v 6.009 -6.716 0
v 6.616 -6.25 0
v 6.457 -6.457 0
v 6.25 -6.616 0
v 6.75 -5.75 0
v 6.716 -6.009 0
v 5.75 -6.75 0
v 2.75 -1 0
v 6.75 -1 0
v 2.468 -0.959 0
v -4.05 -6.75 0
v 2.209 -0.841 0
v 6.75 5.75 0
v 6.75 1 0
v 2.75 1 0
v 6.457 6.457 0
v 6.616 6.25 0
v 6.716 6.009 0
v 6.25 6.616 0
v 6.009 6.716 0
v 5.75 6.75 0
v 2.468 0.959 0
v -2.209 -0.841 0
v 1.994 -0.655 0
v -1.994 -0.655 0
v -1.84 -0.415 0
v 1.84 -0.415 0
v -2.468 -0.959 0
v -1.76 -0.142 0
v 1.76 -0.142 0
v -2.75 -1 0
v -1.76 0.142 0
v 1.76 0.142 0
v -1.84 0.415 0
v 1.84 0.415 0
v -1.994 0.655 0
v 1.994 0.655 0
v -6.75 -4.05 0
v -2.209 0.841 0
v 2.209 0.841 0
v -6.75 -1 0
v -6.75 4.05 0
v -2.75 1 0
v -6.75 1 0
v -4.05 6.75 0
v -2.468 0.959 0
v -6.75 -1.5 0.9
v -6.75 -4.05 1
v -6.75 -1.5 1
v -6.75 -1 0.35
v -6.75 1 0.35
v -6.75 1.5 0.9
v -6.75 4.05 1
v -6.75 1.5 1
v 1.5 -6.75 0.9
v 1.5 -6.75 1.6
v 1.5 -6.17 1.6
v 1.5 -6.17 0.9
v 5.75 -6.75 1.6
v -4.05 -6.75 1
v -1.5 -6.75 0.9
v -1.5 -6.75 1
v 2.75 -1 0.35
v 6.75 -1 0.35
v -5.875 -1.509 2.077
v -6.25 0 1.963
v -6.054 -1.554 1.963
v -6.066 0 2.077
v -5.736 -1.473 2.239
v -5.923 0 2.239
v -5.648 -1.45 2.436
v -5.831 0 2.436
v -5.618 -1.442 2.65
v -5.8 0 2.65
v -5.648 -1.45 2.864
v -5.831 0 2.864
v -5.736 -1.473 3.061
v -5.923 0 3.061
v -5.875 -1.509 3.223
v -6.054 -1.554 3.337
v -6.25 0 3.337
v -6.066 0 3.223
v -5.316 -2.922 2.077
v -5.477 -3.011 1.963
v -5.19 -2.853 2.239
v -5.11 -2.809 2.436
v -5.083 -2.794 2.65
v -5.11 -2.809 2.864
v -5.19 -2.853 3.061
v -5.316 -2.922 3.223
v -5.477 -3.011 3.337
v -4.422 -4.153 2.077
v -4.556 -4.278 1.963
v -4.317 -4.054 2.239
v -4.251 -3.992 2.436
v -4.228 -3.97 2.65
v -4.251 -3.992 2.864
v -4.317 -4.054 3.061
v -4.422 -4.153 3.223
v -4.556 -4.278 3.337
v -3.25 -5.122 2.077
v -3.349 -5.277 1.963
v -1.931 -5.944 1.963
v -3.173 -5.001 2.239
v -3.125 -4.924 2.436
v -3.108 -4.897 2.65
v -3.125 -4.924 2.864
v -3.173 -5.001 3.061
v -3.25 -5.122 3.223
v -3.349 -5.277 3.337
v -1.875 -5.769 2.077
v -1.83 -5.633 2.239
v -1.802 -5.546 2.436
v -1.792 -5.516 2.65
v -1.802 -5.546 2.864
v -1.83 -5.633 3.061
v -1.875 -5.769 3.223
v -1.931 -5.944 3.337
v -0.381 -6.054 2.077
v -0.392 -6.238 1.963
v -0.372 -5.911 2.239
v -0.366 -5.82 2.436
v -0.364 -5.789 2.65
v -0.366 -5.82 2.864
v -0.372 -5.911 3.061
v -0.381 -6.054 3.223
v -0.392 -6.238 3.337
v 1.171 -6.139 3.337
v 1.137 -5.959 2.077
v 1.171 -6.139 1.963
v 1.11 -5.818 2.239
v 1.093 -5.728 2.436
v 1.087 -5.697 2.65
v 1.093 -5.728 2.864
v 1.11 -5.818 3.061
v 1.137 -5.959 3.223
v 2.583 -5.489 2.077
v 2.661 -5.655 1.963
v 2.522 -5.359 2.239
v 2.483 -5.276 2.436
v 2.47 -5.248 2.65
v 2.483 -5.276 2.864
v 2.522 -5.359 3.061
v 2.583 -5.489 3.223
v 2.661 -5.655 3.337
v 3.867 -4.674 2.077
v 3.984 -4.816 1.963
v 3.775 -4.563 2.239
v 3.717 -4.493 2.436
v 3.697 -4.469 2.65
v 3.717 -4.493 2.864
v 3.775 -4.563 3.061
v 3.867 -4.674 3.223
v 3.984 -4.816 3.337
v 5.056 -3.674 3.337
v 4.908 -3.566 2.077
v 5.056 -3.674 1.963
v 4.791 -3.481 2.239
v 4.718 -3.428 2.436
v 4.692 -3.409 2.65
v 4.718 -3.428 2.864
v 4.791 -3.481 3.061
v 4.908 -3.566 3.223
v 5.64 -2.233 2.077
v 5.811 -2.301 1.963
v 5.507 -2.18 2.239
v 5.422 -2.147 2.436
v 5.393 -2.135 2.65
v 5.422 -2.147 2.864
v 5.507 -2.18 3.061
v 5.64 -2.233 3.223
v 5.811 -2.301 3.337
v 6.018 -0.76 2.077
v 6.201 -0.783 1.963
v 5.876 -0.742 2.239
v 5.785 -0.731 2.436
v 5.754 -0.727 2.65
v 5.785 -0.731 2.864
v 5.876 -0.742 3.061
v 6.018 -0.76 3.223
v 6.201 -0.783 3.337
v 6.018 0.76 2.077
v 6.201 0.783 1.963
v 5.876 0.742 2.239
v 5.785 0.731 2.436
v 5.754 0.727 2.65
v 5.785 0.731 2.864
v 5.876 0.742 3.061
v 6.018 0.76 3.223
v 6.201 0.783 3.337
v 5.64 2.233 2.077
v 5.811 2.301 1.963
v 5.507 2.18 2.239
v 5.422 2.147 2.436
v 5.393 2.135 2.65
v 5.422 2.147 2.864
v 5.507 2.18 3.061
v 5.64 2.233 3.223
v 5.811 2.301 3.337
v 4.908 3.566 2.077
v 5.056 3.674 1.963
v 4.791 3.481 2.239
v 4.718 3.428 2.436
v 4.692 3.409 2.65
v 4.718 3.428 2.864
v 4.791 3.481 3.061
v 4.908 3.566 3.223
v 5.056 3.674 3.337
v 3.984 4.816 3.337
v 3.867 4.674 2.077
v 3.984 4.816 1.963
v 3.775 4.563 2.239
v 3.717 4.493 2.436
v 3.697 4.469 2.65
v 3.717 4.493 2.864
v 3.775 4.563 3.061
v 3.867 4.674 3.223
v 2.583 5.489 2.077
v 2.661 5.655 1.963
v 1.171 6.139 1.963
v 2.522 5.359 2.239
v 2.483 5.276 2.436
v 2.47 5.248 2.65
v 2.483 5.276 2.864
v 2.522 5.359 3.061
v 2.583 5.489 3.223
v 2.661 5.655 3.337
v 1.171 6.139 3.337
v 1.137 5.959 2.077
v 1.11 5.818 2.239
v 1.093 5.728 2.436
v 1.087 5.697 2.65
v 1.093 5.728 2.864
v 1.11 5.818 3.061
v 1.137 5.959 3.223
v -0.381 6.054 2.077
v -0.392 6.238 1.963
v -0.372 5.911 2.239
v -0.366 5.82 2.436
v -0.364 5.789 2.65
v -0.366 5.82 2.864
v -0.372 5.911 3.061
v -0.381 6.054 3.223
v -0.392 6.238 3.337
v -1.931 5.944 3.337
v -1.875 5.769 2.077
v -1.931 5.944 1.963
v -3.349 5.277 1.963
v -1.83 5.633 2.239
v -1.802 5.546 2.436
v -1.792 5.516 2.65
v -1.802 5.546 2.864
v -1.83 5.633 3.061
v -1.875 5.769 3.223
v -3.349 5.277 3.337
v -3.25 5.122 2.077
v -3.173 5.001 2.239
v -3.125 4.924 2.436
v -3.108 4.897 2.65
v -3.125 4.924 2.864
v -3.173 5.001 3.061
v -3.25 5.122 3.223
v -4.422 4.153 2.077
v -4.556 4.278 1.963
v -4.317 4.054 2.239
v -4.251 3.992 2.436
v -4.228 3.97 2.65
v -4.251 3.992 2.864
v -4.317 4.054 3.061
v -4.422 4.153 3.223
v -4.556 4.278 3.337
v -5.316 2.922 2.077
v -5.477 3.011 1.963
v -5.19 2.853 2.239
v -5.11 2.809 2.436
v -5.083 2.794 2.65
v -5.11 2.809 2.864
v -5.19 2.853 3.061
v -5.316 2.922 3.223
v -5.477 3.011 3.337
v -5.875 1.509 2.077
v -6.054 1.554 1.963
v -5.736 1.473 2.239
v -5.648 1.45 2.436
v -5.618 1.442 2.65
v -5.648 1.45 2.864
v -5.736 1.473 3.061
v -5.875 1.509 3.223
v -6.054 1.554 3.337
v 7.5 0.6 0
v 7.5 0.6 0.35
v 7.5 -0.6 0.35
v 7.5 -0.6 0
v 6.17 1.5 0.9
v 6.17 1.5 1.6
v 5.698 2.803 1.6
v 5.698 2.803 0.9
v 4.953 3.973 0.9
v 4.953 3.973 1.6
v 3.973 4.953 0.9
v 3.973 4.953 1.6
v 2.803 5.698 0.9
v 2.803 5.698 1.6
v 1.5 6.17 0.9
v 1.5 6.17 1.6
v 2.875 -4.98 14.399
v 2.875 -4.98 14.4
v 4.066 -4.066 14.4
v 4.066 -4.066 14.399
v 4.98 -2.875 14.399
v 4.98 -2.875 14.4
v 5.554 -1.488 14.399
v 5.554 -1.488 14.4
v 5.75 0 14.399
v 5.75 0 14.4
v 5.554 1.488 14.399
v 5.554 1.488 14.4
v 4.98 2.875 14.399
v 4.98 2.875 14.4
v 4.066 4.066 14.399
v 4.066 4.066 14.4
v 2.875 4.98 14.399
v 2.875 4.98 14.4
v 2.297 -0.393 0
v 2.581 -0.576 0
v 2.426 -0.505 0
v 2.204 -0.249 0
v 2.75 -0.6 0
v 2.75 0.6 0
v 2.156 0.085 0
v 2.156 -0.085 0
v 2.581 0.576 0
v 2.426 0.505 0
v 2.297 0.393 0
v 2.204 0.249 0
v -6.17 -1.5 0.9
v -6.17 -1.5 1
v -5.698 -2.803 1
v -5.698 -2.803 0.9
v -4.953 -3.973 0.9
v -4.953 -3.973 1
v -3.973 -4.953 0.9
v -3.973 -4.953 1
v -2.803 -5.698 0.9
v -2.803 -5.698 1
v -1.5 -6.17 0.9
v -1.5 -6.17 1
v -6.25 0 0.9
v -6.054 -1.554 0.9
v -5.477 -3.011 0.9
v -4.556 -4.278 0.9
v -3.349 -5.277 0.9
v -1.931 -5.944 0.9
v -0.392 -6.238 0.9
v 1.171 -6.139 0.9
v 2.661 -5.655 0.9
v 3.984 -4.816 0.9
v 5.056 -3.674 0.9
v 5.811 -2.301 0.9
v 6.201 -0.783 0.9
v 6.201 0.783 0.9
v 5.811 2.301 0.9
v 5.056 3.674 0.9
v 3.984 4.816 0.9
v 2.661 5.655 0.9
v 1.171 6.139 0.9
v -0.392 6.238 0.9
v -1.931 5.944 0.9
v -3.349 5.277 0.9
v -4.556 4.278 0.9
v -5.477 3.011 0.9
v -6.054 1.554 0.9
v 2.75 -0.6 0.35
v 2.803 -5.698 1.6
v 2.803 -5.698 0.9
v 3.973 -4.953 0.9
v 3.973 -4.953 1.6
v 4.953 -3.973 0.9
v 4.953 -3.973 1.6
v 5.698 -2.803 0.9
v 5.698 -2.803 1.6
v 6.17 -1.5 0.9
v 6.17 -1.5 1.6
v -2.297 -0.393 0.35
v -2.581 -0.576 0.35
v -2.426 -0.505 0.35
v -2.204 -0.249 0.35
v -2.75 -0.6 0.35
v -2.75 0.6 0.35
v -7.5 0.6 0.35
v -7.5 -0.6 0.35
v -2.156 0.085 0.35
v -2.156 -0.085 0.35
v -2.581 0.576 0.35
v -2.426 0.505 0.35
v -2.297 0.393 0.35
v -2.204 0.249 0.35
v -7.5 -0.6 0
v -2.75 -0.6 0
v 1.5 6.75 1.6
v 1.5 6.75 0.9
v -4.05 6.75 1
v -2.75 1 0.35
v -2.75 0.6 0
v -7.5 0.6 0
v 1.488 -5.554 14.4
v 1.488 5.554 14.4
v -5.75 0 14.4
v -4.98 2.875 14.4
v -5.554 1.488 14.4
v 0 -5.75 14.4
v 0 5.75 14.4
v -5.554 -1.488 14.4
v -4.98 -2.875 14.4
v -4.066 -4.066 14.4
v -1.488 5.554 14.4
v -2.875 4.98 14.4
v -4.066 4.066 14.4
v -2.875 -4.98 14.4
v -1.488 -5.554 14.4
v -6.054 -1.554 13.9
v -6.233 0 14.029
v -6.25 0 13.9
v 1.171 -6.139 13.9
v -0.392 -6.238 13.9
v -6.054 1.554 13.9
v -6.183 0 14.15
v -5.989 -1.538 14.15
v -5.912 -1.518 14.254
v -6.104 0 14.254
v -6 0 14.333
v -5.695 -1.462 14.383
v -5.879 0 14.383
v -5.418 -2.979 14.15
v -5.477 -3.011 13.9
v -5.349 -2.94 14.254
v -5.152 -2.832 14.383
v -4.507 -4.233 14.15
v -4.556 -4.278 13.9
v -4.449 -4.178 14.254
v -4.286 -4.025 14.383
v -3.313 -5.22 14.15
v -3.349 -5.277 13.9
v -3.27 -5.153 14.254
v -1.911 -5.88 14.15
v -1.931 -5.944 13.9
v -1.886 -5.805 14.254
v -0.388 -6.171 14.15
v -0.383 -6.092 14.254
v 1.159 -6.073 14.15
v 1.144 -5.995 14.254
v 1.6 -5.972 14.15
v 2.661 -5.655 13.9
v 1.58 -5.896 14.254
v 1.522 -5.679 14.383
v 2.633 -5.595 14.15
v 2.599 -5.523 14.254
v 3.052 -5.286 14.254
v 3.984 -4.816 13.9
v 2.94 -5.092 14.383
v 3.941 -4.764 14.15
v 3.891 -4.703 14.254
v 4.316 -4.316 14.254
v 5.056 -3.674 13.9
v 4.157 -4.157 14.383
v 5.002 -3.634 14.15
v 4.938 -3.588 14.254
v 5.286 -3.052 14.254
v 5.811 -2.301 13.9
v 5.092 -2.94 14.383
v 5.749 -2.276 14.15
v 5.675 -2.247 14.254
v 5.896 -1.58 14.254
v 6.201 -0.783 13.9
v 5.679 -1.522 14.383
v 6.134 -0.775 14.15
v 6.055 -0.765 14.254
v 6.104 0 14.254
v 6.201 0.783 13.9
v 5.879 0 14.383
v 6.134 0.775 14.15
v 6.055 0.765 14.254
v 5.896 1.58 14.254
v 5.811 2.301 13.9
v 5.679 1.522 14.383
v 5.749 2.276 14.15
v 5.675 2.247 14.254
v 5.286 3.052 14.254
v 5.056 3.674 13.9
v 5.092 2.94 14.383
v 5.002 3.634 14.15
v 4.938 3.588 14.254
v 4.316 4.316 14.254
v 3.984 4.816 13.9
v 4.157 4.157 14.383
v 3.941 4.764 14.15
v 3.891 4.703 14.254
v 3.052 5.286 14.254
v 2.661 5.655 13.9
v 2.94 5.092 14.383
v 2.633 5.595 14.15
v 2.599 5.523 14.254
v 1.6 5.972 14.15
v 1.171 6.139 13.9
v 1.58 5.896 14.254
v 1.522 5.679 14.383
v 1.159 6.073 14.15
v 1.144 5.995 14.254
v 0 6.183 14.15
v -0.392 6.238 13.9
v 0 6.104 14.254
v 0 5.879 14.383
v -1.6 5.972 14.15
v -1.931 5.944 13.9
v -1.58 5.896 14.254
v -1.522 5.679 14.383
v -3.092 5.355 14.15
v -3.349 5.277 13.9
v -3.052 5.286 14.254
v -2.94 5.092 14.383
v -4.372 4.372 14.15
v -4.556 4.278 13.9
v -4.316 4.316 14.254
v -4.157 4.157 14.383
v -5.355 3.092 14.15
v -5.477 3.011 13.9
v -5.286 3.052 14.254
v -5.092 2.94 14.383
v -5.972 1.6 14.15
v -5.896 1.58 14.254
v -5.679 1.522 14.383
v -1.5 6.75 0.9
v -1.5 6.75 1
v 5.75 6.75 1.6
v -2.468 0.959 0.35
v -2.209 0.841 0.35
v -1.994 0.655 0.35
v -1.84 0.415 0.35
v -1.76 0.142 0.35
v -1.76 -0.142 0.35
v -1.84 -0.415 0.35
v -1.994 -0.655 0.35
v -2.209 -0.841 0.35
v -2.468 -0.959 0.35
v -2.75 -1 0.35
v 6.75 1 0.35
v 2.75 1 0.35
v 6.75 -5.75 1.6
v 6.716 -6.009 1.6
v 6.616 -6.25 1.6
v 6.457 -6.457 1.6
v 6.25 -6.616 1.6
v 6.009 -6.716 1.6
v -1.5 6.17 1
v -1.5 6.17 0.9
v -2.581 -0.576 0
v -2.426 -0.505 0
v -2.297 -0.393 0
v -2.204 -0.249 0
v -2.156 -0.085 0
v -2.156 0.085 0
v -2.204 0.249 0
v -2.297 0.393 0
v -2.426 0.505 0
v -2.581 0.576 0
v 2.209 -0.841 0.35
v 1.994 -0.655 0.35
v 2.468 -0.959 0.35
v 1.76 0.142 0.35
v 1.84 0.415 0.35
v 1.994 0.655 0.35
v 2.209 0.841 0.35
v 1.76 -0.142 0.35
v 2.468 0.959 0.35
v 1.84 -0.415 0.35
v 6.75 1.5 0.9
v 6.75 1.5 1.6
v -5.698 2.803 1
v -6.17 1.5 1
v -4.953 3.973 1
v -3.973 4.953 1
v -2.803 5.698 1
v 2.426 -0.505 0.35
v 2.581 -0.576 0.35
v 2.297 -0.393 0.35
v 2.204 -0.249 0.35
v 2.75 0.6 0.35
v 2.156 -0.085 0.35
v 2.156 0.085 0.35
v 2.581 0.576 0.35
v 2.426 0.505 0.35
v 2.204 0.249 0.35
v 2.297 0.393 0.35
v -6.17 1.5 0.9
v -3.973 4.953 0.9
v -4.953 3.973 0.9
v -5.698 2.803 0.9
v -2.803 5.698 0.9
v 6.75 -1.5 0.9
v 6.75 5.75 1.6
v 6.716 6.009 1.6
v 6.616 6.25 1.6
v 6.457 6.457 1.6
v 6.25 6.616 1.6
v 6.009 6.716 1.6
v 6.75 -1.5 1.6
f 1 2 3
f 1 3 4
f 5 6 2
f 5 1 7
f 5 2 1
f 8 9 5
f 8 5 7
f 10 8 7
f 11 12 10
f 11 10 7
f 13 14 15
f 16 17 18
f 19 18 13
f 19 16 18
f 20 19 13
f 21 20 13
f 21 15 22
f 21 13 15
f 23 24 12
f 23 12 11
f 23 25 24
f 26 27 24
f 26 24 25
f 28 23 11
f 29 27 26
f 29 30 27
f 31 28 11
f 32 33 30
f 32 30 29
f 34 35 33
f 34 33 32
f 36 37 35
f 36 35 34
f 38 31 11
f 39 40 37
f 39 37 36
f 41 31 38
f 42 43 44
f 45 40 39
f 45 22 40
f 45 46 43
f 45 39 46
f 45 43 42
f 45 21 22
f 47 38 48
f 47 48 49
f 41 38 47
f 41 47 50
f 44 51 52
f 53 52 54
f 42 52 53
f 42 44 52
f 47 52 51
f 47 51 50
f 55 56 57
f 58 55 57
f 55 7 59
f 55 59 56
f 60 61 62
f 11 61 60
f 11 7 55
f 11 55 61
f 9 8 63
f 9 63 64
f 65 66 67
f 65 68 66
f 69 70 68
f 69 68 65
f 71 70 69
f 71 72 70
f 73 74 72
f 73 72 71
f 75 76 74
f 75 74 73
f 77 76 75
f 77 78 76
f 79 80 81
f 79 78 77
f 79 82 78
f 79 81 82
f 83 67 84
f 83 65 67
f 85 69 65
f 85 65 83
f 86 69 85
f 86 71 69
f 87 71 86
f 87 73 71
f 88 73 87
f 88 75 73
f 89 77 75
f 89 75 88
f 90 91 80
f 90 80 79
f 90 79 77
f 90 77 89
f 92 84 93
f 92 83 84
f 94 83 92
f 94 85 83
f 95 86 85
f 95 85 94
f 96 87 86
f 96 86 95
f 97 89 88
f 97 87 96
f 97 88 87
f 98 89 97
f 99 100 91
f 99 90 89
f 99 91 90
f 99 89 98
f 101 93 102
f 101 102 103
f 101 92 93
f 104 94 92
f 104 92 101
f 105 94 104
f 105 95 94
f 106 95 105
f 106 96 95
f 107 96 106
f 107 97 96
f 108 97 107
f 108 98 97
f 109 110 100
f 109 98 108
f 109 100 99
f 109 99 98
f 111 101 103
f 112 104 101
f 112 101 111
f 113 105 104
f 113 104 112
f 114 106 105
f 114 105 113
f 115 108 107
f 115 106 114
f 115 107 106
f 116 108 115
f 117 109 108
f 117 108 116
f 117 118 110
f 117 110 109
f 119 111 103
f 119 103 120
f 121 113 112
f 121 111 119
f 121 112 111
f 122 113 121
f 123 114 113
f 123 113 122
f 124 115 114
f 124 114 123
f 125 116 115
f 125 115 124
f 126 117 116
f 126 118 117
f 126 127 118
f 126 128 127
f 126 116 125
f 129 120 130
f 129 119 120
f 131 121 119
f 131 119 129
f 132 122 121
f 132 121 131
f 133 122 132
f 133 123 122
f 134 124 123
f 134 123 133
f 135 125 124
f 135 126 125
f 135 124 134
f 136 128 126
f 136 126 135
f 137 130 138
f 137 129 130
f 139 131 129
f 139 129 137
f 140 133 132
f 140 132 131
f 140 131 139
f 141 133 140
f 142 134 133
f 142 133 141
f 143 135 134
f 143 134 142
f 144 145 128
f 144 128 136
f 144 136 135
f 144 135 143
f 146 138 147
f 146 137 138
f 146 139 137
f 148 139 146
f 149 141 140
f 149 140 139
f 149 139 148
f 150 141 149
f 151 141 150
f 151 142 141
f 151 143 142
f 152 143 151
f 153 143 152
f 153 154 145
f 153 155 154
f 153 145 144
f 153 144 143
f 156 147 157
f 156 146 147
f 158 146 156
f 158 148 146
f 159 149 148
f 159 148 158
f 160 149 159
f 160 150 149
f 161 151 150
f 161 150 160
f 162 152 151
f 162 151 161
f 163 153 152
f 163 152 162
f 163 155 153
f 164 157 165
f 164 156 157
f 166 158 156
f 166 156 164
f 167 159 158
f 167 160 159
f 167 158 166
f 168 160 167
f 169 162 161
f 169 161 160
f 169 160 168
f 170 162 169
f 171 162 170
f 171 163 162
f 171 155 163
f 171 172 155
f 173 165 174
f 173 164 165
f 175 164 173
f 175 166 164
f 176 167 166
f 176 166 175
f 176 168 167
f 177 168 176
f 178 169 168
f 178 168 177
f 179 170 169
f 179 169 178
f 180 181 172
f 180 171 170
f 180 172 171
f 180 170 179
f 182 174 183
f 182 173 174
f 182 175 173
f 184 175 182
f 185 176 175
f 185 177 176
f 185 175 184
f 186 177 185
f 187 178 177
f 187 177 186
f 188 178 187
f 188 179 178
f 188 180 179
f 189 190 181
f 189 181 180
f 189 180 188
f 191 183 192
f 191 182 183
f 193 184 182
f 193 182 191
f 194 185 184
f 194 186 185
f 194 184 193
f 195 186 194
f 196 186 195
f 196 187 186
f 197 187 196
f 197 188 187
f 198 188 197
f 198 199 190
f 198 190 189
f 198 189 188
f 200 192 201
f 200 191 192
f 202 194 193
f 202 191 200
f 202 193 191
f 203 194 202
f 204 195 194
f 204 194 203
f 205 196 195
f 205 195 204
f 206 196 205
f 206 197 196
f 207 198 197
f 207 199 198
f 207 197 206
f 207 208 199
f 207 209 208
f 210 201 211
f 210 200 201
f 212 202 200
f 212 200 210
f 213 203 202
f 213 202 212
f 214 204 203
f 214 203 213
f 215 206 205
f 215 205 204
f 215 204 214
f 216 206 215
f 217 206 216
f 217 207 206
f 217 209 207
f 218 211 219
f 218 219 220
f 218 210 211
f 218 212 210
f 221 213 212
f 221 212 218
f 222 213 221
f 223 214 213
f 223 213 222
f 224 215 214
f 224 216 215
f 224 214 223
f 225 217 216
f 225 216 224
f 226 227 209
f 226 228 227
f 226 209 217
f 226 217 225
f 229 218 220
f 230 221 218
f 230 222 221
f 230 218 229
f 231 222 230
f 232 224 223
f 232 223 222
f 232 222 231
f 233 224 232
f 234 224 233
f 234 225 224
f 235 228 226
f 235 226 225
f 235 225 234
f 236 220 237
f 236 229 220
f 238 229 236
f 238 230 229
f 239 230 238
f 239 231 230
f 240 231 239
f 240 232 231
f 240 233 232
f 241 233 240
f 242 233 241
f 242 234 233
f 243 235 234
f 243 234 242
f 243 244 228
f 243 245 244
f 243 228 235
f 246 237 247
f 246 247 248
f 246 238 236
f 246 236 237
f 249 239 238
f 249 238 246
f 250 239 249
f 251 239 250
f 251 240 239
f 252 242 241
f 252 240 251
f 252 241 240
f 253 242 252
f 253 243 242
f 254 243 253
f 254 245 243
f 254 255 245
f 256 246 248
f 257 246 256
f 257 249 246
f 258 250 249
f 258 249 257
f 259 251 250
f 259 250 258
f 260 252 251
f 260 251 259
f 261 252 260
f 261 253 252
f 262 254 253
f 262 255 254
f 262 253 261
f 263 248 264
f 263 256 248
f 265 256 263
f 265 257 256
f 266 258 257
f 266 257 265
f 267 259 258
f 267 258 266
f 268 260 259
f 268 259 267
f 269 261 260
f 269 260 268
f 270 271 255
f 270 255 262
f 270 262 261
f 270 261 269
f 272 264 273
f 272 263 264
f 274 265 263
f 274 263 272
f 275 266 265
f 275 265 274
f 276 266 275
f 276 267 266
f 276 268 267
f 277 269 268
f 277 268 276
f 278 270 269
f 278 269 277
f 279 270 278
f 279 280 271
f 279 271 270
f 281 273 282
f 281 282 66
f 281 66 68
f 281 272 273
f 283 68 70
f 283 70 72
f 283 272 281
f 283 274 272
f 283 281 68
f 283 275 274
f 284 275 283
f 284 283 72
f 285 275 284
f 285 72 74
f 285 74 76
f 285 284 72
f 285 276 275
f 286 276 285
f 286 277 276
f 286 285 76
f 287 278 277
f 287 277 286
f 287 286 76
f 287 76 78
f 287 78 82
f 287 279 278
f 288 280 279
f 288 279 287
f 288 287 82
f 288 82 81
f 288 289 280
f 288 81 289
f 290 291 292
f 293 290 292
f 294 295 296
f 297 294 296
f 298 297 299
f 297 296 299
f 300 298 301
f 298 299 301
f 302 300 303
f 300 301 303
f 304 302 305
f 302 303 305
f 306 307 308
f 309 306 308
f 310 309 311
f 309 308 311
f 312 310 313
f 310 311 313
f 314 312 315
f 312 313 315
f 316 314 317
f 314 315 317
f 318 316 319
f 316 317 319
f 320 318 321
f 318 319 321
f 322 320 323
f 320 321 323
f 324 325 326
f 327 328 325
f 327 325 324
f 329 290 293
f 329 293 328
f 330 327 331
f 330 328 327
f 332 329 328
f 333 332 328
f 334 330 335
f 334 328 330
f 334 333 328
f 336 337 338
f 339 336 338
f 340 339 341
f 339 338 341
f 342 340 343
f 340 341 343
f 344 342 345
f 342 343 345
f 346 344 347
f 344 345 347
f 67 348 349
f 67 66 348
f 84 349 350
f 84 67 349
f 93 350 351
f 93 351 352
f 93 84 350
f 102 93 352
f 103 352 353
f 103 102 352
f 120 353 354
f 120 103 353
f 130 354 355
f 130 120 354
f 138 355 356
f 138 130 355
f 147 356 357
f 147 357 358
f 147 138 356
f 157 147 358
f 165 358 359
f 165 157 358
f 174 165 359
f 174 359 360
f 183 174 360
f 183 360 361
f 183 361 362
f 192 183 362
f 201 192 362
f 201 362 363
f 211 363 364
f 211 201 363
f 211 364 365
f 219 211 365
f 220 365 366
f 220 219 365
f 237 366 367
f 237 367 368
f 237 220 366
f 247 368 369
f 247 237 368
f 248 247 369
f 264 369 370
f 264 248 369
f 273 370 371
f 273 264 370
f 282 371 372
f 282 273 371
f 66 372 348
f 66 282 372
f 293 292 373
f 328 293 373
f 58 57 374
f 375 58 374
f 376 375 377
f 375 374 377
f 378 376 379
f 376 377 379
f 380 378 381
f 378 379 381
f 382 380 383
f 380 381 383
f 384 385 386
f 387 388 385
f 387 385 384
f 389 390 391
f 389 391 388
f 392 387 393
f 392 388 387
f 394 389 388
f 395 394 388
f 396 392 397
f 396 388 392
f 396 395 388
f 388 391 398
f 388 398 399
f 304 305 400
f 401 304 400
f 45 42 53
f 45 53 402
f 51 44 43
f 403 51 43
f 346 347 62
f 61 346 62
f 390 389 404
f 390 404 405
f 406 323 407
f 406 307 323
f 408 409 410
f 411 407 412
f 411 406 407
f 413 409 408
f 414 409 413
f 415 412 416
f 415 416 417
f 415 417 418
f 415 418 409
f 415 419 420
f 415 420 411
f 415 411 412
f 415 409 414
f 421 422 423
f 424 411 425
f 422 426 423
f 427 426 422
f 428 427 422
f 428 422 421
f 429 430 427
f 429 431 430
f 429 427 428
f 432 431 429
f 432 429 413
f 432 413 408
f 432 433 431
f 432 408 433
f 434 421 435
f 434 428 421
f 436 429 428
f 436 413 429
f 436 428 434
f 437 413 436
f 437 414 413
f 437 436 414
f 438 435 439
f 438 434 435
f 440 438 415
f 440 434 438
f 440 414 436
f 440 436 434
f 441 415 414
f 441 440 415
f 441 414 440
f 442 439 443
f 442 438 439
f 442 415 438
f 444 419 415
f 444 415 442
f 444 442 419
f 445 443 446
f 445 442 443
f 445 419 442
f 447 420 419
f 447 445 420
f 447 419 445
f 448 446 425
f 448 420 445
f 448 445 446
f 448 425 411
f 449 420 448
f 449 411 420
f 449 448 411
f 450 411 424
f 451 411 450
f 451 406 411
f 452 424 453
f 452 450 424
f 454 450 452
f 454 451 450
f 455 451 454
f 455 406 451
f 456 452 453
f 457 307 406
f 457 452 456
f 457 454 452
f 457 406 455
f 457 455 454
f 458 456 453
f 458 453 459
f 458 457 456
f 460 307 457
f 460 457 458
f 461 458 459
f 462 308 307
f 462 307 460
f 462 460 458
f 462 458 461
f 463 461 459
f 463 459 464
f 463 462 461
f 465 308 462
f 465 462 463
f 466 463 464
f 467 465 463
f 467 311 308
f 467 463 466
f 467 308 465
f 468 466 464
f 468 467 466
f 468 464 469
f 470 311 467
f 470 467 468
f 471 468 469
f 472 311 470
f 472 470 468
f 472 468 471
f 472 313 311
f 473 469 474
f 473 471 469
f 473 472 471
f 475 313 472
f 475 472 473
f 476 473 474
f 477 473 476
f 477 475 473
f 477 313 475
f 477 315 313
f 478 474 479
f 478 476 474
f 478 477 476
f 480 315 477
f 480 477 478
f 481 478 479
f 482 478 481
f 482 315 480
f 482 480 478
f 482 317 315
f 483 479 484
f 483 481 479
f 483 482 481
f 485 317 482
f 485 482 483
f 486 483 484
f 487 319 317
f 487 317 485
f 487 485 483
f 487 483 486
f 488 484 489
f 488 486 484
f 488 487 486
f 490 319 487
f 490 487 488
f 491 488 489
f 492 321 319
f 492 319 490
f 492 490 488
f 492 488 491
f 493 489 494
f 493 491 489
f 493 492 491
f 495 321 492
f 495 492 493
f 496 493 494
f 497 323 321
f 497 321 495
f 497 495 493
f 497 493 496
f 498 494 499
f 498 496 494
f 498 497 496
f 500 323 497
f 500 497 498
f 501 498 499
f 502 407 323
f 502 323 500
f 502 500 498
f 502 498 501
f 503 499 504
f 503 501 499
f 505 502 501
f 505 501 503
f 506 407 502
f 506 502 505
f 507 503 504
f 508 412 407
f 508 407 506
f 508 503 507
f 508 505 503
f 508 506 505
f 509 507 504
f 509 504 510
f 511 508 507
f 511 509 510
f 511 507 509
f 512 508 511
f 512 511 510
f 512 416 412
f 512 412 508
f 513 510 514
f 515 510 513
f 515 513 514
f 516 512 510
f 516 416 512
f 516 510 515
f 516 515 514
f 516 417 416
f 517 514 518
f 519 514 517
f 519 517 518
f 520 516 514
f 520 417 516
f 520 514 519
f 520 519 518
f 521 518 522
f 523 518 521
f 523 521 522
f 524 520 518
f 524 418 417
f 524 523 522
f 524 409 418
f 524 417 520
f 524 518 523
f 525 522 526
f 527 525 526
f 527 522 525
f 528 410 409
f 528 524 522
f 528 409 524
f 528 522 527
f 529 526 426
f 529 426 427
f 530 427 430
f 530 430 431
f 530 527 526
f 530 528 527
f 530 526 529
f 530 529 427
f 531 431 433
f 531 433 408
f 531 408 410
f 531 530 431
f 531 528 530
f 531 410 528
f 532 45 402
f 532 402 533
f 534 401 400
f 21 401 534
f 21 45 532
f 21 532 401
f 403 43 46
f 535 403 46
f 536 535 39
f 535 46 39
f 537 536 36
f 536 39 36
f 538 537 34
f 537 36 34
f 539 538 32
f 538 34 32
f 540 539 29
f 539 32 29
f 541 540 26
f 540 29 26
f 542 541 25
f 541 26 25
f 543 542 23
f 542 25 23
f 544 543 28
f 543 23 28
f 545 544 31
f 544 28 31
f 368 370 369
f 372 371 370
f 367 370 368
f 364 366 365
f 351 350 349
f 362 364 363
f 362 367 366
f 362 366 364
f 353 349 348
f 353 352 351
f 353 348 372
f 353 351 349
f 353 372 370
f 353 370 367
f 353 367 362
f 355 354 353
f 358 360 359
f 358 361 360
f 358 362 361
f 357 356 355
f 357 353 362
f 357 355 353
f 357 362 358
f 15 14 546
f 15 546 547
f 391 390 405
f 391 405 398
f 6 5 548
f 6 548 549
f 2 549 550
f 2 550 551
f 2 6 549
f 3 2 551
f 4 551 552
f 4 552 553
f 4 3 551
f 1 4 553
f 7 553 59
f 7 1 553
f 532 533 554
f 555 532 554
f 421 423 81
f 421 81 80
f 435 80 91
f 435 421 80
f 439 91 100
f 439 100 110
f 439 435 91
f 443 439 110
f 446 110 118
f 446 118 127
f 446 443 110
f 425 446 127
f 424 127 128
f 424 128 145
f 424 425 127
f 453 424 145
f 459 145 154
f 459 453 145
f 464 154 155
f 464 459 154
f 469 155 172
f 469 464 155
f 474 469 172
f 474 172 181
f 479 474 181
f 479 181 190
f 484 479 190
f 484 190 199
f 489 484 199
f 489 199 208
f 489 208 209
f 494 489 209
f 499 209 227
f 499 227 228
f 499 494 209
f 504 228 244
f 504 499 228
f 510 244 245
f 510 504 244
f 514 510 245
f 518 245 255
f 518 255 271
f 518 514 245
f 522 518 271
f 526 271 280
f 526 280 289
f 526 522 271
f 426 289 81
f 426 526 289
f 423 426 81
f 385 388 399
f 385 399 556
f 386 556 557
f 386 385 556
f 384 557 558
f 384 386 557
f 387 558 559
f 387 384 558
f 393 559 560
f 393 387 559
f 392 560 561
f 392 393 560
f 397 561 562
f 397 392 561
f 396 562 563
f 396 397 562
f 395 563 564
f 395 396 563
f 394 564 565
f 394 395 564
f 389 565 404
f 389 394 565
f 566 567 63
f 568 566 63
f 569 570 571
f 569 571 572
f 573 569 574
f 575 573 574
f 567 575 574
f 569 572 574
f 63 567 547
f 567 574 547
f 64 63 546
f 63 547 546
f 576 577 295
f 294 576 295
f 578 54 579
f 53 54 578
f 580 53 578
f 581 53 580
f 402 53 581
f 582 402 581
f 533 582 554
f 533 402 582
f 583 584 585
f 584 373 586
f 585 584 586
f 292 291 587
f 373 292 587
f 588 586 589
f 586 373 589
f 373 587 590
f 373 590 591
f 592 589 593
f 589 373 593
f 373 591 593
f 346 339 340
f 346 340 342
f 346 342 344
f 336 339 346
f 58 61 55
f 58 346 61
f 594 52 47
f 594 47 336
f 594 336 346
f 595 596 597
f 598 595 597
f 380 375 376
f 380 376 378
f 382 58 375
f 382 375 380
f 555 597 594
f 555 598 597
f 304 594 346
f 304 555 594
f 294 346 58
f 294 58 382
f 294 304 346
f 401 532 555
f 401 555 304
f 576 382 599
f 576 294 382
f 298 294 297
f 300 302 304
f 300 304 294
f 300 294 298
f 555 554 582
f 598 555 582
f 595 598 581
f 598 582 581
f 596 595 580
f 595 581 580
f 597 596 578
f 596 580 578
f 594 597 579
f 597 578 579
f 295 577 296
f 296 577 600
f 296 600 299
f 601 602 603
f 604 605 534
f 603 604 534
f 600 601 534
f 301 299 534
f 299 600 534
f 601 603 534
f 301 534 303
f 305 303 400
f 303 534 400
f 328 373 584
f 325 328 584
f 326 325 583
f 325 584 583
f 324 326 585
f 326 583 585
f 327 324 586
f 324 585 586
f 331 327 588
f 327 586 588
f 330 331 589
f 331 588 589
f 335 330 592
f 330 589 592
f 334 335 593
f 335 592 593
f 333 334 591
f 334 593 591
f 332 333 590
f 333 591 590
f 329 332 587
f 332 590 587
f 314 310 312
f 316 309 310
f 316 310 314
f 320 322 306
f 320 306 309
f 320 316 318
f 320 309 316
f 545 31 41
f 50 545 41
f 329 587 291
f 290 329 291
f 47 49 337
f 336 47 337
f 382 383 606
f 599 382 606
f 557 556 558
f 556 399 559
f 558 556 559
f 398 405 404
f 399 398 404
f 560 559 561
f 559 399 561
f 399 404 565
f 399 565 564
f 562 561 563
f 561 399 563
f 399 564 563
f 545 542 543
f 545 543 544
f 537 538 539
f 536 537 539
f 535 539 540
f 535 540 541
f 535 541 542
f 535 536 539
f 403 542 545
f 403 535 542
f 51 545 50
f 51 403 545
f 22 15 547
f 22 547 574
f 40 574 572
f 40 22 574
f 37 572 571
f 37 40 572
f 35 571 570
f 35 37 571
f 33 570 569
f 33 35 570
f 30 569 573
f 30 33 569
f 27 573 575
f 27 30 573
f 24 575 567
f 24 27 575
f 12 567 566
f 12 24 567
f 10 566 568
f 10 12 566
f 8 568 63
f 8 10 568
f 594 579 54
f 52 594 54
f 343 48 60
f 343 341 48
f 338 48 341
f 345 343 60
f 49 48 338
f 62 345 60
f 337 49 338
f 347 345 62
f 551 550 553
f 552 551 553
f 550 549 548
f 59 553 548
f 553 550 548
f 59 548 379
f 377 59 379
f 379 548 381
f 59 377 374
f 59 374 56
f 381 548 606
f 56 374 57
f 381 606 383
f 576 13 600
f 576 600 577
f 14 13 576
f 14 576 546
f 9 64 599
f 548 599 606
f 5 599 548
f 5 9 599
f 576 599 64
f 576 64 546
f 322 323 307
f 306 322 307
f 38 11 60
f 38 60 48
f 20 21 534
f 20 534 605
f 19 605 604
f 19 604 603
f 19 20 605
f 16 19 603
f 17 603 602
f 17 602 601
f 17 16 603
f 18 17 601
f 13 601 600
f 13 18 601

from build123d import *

# Parameters (mm, degrees)
BOSS_EXTRUDE1_DEPTH   = 1.6
CUT_EXTRUDE1_DEPTH    = 0.7
CUT_EXTRUDE2_DEPTH    = 0.6
CUT_EXTRUDE4_DEPTH    = 0.35
FILLET1_R             = 0.5
CUT_EXTRUDE3_DEPTH    = 0.001
BOSS_EXTRUDE2_DEPTH   = 0.35
BOSS_EXTRUDE2_2_DEPTH = 0.35


with BuildPart() as part:
    # Sketch1 → Boss-Extrude1 (new body)
    with BuildSketch(Plane.XY):
        with BuildLine():
            Line((-6.75, 4.05), (-4.05, 6.75))
            Line((-4.05, 6.75), (5.75, 6.75))
            ThreePointArc((5.75, 6.75), (6.457106781, 6.457106781), (6.75, 5.75))
            Line((6.75, 5.75), (6.75, -5.75))
            ThreePointArc((6.75, -5.75), (6.457106781, -6.457106781), (5.75, -6.75))
            Line((5.75, -6.75), (-4.05, -6.75))
            Line((-4.05, -6.75), (-6.75, -4.05))
            Line((-6.75, -4.05), (-6.75, 4.05))
        make_face()
    extrude(amount=BOSS_EXTRUDE1_DEPTH)

    # Sketch2 → Cut-Extrude1 (cut)
    with BuildSketch(Plane.XY.offset(1.6)):
        with BuildLine():
            Line((-1.5, -6.75), (1.5, -6.75))
            Line((1.5, -6.75), (1.5, -6.170291727))
            ThreePointArc((1.5, -6.170291727), (4.490128061, -4.490128061), (6.170291727, -1.5))
            Line((6.170291727, -1.5), (6.75, -1.5))
            Line((6.75, -1.5), (6.75, 1.5))
            Line((6.75, 1.5), (6.170291727, 1.5))
            ThreePointArc((6.170291727, 1.5), (4.490128061, 4.490128061), (1.5, 6.170291727))
            Line((1.5, 6.170291727), (1.5, 6.75))
            Line((1.5, 6.75), (-1.5, 6.75))
            Line((-1.5, 6.75), (-1.5, 6.170291727))
            ThreePointArc((-1.5, 6.170291727), (-4.490128061, 4.490128061), (-6.170291727, 1.5))
            Line((-6.170291727, 1.5), (-6.75, 1.5))
            Line((-6.75, 1.5), (-6.75, -1.5))
            Line((-6.75, -1.5), (-6.170291727, -1.5))
            ThreePointArc((-6.170291727, -1.5), (-4.490128061, -4.490128061), (-1.5, -6.170291727))
            Line((-1.5, -6.170291727), (-1.5, -6.75))
        make_face()
    extrude(amount=-CUT_EXTRUDE1_DEPTH, mode=Mode.SUBTRACT)

    # Sketch3 → Cut-Extrude2 (cut)
    with BuildSketch(Plane.XY.offset(1.6)):
        with BuildLine():
            Line((-4.05, -6.75), (-1.5, -6.75))
            Line((-1.5, -6.75), (-1.5, -6.170291727))
            ThreePointArc((-1.5, -6.170291727), (-4.490128061, -4.490128061), (-6.170291727, -1.5))
            Line((-6.170291727, -1.5), (-6.75, -1.5))
            Line((-6.75, -1.5), (-6.75, -4.05))
            Line((-6.75, -4.05), (-4.05, -6.75))
        make_face()
        with BuildLine():
            Line((-6.75, 4.05), (-6.75, 1.5))
            Line((-6.75, 1.5), (-6.170291727, 1.5))
            ThreePointArc((-6.170291727, 1.5), (-4.490128061, 4.490128061), (-1.5, 6.170291727))
            Line((-1.5, 6.170291727), (-1.5, 6.75))
            Line((-1.5, 6.75), (-4.05, 6.75))
            Line((-4.05, 6.75), (-6.75, 4.05))
        make_face()
    extrude(amount=-CUT_EXTRUDE2_DEPTH, mode=Mode.SUBTRACT)

    # Sketch7 → Cut-Extrude4 (cut)
    with BuildSketch(Plane(origin=(0, 0, 0), x_dir=(-1, 0, 0), z_dir=(0, 0, -1))):
        with BuildLine():
            Line((-2.75, -1), (-6.75, -1))
            Line((-6.75, -1), (-6.75, 1))
            Line((-6.75, 1), (-2.75, 1))
            ThreePointArc((-2.75, 1), (-1.75, 0), (-2.75, -1))
        make_face()
        with BuildLine():
            Line((2.75, -1), (6.75, -1))
            Line((6.75, -1), (6.75, 1))
            Line((6.75, 1), (2.75, 1))
            ThreePointArc((2.75, 1), (1.75, 0), (2.75, -1))
        make_face()
    extrude(amount=-CUT_EXTRUDE4_DEPTH, mode=Mode.SUBTRACT)


with BuildPart() as body_2:
    # Sketch5 → Revolve1 (revolve)
    with BuildSketch(Plane(origin=(0, 0, 0), x_dir=(0, 0, -1), z_dir=(1, 0, 0)), mode=Mode.PRIVATE) as revolve1_sk:
        with BuildLine():
            Line((-0.9, -6.25), (-1.962613646, -6.25))
            ThreePointArc((-1.962613646, -6.25), (-2.65, -5.8), (-3.337386354, -6.25))
            Line((-3.337386354, -6.25), (-14.4, -6.25))
            Line((-14.4, -6.25), (-14.4, 0))
            Line((-14.4, 0), (-0.9, 0))
            Line((-0.9, 0), (-0.9, -6.25))
        make_face()
    revolve(revolve1_sk.sketch.rotate(Axis((0, 0, 0), (0, 0, 1)), 270), axis=Axis((0, 0, 0), (0, 0, 1)))

    # Fillet1
    fillet1_edges = [body_2.edges().sort_by_distance(p)[0] for p in [
        (6.25, 0, 14.4),
    ]]
    fillet(fillet1_edges, radius=FILLET1_R)

    # Sketch6 → Cut-Extrude3 (cut)
    with BuildSketch(Plane.XY.offset(14.4)):
        with BuildLine():
            Line((2.875, 4.979646072), (2.875, -4.979646072))
            ThreePointArc((2.875, -4.979646072), (5.75, 0), (2.875, 4.979646072))
        make_face()
    extrude(amount=-CUT_EXTRUDE3_DEPTH, mode=Mode.SUBTRACT)


with BuildPart() as body_3:
    # Sketch9 → Boss-Extrude2 (new body)
    with BuildSketch(Plane(origin=(0, 0, 0.35), x_dir=(-1, 0, 0), z_dir=(0, 0, -1))):
        with BuildLine():
            Line((7.5, 0.6), (7.5, -0.6))
            Line((7.5, -0.6), (2.75, -0.6))
            ThreePointArc((2.75, -0.6), (2.15, 0), (2.75, 0.6))
            Line((2.75, 0.6), (7.5, 0.6))
        make_face()
    extrude(amount=BOSS_EXTRUDE2_DEPTH)


with BuildPart() as body_4:
    # Sketch9 → Boss-Extrude2 2 (new body)
    with BuildSketch(Plane(origin=(0, 0, 0.35), x_dir=(-1, 0, 0), z_dir=(0, 0, -1))):
        with BuildLine():
            Line((-7.5, 0.6), (-7.5, -0.6))
            Line((-7.5, -0.6), (-2.75, -0.6))
            ThreePointArc((-2.75, -0.6), (-2.15, 0), (-2.75, 0.6))
            Line((-2.75, 0.6), (-7.5, 0.6))
        make_face()
    extrude(amount=BOSS_EXTRUDE2_2_DEPTH)


solid = Compound([part.part, body_2.part, body_3.part, body_4.part])
